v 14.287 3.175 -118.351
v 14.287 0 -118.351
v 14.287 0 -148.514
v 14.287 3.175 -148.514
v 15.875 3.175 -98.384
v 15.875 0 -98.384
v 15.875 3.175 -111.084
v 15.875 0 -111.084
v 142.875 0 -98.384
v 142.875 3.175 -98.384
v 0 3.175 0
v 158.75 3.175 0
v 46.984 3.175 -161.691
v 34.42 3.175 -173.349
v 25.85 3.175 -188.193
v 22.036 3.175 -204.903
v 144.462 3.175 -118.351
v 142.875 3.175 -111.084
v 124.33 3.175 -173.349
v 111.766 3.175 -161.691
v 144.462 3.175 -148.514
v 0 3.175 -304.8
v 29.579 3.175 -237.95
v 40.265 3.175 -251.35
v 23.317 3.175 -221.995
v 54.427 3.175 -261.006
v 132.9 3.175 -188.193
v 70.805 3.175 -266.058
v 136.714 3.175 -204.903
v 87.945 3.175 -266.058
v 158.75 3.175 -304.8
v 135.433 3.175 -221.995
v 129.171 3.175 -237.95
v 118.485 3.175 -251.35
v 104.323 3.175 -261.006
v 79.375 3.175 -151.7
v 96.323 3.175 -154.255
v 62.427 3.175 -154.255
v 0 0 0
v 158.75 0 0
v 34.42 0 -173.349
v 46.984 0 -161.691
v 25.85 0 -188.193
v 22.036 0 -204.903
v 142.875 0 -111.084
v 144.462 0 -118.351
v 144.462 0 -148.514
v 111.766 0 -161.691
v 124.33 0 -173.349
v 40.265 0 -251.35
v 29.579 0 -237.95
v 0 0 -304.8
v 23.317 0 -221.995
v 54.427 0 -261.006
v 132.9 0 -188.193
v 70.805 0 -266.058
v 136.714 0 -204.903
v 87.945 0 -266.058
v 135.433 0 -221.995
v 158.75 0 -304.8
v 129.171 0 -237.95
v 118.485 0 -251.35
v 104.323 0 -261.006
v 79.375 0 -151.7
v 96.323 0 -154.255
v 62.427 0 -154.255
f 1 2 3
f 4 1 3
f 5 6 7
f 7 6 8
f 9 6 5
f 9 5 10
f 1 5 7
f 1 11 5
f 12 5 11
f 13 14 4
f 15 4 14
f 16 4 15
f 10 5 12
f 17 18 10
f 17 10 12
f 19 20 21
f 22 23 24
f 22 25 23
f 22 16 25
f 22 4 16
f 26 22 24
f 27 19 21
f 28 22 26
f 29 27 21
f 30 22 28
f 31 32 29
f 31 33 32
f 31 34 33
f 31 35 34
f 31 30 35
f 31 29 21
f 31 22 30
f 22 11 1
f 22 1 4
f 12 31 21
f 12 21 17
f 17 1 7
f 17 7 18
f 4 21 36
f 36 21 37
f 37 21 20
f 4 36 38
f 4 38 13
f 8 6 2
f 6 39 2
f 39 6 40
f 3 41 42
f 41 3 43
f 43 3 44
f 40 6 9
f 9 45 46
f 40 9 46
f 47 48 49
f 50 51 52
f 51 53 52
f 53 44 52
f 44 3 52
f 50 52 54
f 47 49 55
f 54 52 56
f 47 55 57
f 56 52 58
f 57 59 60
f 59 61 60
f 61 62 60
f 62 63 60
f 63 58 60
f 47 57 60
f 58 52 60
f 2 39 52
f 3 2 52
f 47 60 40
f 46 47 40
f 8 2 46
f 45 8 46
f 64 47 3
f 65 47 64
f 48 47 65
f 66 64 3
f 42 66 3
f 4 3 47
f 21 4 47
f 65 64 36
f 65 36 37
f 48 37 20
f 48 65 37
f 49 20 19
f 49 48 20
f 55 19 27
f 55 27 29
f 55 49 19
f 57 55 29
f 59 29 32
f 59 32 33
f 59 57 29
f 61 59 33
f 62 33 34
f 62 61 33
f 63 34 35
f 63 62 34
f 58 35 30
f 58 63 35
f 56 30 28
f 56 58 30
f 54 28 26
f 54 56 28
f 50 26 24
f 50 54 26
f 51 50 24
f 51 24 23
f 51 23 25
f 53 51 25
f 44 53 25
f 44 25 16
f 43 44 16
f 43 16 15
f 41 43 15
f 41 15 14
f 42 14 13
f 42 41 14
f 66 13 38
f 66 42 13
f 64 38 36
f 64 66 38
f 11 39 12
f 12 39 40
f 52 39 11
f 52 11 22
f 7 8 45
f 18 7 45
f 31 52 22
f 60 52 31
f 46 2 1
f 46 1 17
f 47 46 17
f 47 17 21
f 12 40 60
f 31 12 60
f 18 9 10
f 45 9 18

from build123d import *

# Parameters (mm, degrees)
SKETCH1_W           = 158.75
SKETCH1_H           = 304.8
SKETCH1_R           = 57.5
SKETCH1_W_2         = 130.175
SKETCH1_H_2         = 30.1625
SKETCH1_W_3         = 127
SKETCH1_H_3         = 12.7
BOSS_EXTRUDE1_DEPTH = 3.175


with BuildPart() as part:
    # Sketch1 → Boss-Extrude1 (new body)
    with BuildSketch(Plane(origin=(0, 0, 0), x_dir=(1, 0, 0), z_dir=(0, 1, 0))):
        with Locations((79.375, 152.4)):
            Rectangle(SKETCH1_W, SKETCH1_H)
        with Locations(Location((79.375, 209.2, 0), (0, 0, 270))):
            Circle(SKETCH1_R, mode=Mode.SUBTRACT)
        with Locations((79.375, 133.432370025)):
            Rectangle(SKETCH1_W_2, SKETCH1_H_2, mode=Mode.SUBTRACT)
        with Locations((79.375, 104.734192112)):
            Rectangle(SKETCH1_W_3, SKETCH1_H_3, mode=Mode.SUBTRACT)
    extrude(amount=BOSS_EXTRUDE1_DEPTH)


solid = part.part
